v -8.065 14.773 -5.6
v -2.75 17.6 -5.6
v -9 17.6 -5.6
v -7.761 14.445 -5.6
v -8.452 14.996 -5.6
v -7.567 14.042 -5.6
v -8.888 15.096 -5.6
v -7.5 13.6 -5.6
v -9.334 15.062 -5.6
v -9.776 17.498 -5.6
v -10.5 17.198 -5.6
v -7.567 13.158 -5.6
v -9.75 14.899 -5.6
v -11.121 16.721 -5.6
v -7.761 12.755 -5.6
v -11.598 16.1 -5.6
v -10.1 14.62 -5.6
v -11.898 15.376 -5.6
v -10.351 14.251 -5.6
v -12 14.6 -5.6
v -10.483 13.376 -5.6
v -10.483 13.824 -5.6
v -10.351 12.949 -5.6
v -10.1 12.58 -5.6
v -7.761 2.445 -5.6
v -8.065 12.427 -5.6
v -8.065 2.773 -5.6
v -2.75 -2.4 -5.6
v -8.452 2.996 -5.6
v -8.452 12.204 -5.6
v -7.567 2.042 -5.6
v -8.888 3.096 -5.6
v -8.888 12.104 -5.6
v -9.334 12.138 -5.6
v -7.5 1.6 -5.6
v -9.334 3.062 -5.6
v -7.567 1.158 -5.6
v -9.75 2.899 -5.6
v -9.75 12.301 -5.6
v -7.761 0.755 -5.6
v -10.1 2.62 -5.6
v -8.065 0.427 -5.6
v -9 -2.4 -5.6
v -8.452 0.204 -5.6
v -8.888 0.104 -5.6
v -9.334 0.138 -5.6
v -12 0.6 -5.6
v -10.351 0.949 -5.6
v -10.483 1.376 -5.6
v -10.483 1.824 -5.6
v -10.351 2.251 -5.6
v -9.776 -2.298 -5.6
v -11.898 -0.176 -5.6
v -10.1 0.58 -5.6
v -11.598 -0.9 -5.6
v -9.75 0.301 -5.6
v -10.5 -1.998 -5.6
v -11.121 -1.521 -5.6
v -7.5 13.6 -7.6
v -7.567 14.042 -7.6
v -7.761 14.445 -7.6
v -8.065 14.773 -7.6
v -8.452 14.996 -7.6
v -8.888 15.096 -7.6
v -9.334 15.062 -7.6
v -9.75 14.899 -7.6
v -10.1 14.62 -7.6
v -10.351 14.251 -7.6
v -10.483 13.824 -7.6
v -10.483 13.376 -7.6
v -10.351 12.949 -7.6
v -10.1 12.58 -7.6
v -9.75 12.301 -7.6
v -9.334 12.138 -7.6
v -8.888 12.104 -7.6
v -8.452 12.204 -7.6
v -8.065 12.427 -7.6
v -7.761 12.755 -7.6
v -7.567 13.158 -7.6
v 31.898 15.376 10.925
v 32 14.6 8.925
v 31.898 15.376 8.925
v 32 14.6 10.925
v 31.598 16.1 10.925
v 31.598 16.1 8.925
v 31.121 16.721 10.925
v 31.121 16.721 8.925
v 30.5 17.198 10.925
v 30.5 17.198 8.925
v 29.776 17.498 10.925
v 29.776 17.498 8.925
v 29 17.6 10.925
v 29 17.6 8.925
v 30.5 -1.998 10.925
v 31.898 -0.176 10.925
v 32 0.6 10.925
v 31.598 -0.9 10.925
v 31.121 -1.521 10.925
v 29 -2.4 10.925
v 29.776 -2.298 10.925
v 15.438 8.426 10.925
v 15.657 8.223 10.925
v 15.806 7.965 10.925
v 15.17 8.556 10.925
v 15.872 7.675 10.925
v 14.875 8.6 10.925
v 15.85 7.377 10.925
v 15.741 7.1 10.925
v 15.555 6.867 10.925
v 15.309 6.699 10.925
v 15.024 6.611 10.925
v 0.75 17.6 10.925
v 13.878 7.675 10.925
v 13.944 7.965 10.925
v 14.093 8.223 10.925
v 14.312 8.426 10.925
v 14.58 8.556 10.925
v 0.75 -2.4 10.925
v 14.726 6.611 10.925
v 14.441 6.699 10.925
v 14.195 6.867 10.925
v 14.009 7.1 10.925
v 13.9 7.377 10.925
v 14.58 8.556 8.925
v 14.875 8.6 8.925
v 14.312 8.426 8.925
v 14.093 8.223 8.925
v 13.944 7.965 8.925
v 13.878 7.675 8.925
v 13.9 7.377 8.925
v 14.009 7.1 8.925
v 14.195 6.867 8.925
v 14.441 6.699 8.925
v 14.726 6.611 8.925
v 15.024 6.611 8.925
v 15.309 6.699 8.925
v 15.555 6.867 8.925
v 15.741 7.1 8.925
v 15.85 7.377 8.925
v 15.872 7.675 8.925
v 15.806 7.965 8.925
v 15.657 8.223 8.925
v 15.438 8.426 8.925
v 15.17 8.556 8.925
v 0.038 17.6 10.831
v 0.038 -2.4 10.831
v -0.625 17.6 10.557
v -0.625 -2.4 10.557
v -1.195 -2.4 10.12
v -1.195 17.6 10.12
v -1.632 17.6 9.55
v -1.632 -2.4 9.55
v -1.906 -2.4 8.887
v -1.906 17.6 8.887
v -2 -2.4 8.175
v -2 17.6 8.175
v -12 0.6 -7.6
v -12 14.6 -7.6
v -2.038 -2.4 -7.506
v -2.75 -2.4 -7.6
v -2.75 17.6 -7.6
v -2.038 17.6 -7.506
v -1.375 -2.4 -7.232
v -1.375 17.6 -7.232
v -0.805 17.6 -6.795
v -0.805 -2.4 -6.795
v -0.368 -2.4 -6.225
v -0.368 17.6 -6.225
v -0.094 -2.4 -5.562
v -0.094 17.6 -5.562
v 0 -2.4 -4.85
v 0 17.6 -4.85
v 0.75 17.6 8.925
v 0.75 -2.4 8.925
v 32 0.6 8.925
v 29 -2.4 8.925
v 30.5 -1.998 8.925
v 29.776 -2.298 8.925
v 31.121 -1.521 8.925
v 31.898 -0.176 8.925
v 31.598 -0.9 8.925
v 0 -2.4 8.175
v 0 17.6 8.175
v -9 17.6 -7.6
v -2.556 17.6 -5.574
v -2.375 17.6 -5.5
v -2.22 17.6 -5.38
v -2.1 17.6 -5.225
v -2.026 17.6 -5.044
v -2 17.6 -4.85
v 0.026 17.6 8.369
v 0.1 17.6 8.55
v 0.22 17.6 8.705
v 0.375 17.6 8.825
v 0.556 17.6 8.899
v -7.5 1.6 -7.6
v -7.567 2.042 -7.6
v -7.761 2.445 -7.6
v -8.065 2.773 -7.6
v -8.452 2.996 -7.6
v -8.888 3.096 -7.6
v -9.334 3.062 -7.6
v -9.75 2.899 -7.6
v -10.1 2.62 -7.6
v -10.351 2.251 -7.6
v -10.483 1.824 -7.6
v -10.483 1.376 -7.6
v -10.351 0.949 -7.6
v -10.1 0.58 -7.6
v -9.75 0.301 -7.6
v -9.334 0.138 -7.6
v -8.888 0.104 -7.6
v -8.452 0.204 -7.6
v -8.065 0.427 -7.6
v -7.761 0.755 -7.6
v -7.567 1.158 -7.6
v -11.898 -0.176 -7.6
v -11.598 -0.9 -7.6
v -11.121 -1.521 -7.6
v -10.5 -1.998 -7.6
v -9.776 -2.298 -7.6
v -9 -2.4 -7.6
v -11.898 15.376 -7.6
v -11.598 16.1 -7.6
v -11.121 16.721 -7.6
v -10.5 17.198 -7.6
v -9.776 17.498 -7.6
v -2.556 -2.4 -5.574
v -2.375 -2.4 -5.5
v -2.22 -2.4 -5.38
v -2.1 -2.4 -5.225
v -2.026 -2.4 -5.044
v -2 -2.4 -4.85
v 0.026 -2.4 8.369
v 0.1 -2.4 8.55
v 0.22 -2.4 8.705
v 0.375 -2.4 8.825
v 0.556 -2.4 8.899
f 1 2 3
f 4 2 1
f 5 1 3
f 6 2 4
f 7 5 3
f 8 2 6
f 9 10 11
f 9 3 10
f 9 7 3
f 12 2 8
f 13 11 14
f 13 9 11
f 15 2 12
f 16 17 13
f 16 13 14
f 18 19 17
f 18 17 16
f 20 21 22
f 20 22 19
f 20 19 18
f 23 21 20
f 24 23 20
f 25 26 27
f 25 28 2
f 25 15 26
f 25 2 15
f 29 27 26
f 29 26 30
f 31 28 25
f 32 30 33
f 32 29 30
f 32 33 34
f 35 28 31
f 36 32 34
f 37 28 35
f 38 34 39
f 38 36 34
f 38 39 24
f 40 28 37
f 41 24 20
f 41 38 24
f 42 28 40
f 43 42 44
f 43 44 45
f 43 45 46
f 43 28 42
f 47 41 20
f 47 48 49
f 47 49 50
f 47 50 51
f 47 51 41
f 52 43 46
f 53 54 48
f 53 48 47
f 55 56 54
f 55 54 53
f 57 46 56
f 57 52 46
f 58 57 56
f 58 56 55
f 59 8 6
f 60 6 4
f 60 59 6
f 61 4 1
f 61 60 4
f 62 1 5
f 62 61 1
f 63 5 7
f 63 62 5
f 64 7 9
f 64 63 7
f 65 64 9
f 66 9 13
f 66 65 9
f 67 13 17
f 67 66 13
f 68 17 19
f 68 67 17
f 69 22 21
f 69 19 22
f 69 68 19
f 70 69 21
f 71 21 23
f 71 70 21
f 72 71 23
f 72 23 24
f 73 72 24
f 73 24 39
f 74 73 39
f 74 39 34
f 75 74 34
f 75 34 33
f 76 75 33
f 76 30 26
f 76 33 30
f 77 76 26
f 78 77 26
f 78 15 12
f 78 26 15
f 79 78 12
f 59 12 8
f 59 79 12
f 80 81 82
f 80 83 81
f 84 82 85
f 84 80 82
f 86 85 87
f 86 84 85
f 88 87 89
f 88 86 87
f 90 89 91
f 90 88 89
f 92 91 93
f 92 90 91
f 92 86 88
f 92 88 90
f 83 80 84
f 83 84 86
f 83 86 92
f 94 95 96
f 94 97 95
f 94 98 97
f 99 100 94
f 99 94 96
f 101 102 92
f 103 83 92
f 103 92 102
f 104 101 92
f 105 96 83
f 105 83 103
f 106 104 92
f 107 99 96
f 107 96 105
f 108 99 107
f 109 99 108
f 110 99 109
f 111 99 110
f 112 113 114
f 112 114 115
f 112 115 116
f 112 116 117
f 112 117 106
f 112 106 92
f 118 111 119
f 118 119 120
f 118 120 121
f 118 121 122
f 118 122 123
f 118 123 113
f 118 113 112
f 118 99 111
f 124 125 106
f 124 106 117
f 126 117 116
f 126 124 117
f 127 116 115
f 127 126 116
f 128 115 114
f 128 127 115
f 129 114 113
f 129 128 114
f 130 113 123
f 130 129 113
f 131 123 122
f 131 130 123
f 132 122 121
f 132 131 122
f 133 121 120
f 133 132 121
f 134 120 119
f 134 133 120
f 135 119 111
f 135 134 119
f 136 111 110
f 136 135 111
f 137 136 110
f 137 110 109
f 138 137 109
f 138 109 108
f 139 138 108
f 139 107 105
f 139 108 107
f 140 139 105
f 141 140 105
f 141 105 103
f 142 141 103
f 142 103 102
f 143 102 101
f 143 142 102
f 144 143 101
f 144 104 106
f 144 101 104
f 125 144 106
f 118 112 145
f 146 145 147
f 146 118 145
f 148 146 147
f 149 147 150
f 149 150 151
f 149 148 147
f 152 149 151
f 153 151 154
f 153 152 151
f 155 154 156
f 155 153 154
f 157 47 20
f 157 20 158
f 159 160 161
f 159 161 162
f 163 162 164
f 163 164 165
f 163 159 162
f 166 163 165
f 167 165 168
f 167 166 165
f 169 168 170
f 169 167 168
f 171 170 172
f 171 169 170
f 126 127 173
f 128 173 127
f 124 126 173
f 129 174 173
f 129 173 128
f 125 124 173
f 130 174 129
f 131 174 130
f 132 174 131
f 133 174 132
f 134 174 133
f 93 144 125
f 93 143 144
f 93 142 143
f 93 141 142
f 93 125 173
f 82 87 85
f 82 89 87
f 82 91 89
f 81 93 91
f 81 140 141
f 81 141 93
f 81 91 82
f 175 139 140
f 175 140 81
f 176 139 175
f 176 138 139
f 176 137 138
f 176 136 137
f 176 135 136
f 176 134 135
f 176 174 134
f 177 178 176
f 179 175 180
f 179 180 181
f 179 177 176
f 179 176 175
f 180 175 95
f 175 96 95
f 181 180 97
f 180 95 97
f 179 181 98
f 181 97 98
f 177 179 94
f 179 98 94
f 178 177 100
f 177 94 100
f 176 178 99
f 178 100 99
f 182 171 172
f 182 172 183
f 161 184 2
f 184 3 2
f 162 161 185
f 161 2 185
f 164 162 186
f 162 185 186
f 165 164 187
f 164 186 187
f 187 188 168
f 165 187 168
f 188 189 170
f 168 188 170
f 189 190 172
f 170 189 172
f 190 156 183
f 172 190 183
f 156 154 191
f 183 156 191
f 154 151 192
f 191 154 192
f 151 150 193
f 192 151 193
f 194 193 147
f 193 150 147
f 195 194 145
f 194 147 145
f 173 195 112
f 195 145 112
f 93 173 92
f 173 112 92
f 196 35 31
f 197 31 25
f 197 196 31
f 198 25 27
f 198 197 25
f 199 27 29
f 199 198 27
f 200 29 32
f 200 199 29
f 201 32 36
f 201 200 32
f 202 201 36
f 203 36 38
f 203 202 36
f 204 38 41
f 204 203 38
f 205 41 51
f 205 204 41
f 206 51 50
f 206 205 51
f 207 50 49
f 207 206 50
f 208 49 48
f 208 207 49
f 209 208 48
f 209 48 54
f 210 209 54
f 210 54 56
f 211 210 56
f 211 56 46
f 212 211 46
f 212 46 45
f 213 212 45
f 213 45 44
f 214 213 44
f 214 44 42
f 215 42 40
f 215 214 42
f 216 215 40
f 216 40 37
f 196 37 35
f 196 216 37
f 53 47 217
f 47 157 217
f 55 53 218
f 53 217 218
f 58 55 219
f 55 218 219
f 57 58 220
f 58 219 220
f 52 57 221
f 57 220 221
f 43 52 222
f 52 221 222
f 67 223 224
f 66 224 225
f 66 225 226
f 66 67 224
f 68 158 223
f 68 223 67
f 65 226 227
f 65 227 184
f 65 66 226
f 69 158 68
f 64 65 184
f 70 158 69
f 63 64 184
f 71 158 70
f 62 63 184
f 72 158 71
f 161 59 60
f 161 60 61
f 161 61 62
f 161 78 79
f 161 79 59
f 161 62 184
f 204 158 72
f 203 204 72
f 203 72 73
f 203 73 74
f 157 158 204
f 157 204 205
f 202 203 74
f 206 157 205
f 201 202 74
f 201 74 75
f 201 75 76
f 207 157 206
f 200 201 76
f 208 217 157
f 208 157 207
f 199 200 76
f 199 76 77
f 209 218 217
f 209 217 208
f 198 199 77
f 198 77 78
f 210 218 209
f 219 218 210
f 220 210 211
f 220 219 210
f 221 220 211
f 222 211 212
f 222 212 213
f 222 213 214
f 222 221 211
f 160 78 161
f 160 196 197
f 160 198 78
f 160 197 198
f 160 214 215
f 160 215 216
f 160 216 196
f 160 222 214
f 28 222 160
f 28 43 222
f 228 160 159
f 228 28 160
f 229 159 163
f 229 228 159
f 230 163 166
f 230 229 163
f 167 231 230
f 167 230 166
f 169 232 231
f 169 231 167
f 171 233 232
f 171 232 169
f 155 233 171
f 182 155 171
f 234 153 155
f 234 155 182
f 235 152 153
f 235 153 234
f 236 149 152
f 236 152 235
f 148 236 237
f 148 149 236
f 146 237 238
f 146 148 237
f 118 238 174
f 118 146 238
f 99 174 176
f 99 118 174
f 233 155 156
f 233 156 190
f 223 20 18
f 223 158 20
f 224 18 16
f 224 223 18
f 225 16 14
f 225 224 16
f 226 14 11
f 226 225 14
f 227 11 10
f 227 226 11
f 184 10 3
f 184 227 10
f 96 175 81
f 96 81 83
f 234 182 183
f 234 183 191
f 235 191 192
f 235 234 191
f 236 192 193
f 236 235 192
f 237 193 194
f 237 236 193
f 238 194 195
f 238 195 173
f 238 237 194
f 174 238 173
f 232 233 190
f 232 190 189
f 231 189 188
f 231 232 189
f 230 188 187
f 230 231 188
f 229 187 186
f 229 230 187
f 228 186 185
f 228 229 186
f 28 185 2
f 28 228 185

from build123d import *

# Parameters (mm, degrees)
BASE_FLANGE1_DEPTH    = 10
FILLET1_R             = 3
SKETCH7_R             = 1.5
SKETCH7_R_2           = 1
CUT_EXTRUDE1_DEPTH    = 39.303728604
BODY_MOVE_COPY1_ANGLE = 90


# Sheet-metal steps are written as plain solids
with BuildPart() as part:
    # Sketch1 → Base-Flange1 (new, symmetric)
    with BuildSketch(Plane.XY):
        with BuildLine():
            Line((-12, 0), (-2.75, 0))
            ThreePointArc((-2.75, 0), (-0.805456352, 0.805456352), (0, 2.75))
            Line((0, 2.75), (0, 15.775))
            ThreePointArc((0, 15.775), (0.219669914, 16.305330086), (0.75, 16.525))
            Line((0.75, 16.525), (32, 16.525))
            Line((32, 16.525), (32, 18.525))
            Line((32, 18.525), (0.75, 18.525))
            ThreePointArc((0.75, 18.525), (-1.194543648, 17.719543648), (-2, 15.775))
            Line((-2, 15.775), (-2, 2.75))
            ThreePointArc((-2, 2.75), (-2.219669914, 2.219669914), (-2.75, 2))
            Line((-2.75, 2), (-12, 2))
            Line((-12, 2), (-12, 0))
        make_face()
    extrude(amount=BASE_FLANGE1_DEPTH, both=True)

    # Fillet1
    fillet1_edges = [part.edges().sort_by_distance(p)[0] for p in [
        (32, 17.525, -10),
        (-12, 1, -10),
        (32, 17.525, 10),
        (-12, 1, 10),
    ]]
    fillet(fillet1_edges, radius=FILLET1_R)

    # Sketch7 → Cut-Extrude1 (cut, through all)
    with BuildSketch(Plane(origin=(0, 0, 0), x_dir=(1, 0, 0), z_dir=(0, 1, 0))):
        with Locations((-9, 6)):
            Circle(SKETCH7_R)
        with Locations((-9, -6)):
            Circle(SKETCH7_R)
        with Locations(Location((14.875, 0, 0), (0, 0, 90))):
            Circle(SKETCH7_R_2)
    extrude(amount=CUT_EXTRUDE1_DEPTH, mode=Mode.SUBTRACT)


with BuildPart() as part_1:
    # Body-Move/Copy1: moved
    add(part.part.rotate(Axis((0, 7.6, 0), (1, 0, 0)), BODY_MOVE_COPY1_ANGLE))


solid = part_1.part
